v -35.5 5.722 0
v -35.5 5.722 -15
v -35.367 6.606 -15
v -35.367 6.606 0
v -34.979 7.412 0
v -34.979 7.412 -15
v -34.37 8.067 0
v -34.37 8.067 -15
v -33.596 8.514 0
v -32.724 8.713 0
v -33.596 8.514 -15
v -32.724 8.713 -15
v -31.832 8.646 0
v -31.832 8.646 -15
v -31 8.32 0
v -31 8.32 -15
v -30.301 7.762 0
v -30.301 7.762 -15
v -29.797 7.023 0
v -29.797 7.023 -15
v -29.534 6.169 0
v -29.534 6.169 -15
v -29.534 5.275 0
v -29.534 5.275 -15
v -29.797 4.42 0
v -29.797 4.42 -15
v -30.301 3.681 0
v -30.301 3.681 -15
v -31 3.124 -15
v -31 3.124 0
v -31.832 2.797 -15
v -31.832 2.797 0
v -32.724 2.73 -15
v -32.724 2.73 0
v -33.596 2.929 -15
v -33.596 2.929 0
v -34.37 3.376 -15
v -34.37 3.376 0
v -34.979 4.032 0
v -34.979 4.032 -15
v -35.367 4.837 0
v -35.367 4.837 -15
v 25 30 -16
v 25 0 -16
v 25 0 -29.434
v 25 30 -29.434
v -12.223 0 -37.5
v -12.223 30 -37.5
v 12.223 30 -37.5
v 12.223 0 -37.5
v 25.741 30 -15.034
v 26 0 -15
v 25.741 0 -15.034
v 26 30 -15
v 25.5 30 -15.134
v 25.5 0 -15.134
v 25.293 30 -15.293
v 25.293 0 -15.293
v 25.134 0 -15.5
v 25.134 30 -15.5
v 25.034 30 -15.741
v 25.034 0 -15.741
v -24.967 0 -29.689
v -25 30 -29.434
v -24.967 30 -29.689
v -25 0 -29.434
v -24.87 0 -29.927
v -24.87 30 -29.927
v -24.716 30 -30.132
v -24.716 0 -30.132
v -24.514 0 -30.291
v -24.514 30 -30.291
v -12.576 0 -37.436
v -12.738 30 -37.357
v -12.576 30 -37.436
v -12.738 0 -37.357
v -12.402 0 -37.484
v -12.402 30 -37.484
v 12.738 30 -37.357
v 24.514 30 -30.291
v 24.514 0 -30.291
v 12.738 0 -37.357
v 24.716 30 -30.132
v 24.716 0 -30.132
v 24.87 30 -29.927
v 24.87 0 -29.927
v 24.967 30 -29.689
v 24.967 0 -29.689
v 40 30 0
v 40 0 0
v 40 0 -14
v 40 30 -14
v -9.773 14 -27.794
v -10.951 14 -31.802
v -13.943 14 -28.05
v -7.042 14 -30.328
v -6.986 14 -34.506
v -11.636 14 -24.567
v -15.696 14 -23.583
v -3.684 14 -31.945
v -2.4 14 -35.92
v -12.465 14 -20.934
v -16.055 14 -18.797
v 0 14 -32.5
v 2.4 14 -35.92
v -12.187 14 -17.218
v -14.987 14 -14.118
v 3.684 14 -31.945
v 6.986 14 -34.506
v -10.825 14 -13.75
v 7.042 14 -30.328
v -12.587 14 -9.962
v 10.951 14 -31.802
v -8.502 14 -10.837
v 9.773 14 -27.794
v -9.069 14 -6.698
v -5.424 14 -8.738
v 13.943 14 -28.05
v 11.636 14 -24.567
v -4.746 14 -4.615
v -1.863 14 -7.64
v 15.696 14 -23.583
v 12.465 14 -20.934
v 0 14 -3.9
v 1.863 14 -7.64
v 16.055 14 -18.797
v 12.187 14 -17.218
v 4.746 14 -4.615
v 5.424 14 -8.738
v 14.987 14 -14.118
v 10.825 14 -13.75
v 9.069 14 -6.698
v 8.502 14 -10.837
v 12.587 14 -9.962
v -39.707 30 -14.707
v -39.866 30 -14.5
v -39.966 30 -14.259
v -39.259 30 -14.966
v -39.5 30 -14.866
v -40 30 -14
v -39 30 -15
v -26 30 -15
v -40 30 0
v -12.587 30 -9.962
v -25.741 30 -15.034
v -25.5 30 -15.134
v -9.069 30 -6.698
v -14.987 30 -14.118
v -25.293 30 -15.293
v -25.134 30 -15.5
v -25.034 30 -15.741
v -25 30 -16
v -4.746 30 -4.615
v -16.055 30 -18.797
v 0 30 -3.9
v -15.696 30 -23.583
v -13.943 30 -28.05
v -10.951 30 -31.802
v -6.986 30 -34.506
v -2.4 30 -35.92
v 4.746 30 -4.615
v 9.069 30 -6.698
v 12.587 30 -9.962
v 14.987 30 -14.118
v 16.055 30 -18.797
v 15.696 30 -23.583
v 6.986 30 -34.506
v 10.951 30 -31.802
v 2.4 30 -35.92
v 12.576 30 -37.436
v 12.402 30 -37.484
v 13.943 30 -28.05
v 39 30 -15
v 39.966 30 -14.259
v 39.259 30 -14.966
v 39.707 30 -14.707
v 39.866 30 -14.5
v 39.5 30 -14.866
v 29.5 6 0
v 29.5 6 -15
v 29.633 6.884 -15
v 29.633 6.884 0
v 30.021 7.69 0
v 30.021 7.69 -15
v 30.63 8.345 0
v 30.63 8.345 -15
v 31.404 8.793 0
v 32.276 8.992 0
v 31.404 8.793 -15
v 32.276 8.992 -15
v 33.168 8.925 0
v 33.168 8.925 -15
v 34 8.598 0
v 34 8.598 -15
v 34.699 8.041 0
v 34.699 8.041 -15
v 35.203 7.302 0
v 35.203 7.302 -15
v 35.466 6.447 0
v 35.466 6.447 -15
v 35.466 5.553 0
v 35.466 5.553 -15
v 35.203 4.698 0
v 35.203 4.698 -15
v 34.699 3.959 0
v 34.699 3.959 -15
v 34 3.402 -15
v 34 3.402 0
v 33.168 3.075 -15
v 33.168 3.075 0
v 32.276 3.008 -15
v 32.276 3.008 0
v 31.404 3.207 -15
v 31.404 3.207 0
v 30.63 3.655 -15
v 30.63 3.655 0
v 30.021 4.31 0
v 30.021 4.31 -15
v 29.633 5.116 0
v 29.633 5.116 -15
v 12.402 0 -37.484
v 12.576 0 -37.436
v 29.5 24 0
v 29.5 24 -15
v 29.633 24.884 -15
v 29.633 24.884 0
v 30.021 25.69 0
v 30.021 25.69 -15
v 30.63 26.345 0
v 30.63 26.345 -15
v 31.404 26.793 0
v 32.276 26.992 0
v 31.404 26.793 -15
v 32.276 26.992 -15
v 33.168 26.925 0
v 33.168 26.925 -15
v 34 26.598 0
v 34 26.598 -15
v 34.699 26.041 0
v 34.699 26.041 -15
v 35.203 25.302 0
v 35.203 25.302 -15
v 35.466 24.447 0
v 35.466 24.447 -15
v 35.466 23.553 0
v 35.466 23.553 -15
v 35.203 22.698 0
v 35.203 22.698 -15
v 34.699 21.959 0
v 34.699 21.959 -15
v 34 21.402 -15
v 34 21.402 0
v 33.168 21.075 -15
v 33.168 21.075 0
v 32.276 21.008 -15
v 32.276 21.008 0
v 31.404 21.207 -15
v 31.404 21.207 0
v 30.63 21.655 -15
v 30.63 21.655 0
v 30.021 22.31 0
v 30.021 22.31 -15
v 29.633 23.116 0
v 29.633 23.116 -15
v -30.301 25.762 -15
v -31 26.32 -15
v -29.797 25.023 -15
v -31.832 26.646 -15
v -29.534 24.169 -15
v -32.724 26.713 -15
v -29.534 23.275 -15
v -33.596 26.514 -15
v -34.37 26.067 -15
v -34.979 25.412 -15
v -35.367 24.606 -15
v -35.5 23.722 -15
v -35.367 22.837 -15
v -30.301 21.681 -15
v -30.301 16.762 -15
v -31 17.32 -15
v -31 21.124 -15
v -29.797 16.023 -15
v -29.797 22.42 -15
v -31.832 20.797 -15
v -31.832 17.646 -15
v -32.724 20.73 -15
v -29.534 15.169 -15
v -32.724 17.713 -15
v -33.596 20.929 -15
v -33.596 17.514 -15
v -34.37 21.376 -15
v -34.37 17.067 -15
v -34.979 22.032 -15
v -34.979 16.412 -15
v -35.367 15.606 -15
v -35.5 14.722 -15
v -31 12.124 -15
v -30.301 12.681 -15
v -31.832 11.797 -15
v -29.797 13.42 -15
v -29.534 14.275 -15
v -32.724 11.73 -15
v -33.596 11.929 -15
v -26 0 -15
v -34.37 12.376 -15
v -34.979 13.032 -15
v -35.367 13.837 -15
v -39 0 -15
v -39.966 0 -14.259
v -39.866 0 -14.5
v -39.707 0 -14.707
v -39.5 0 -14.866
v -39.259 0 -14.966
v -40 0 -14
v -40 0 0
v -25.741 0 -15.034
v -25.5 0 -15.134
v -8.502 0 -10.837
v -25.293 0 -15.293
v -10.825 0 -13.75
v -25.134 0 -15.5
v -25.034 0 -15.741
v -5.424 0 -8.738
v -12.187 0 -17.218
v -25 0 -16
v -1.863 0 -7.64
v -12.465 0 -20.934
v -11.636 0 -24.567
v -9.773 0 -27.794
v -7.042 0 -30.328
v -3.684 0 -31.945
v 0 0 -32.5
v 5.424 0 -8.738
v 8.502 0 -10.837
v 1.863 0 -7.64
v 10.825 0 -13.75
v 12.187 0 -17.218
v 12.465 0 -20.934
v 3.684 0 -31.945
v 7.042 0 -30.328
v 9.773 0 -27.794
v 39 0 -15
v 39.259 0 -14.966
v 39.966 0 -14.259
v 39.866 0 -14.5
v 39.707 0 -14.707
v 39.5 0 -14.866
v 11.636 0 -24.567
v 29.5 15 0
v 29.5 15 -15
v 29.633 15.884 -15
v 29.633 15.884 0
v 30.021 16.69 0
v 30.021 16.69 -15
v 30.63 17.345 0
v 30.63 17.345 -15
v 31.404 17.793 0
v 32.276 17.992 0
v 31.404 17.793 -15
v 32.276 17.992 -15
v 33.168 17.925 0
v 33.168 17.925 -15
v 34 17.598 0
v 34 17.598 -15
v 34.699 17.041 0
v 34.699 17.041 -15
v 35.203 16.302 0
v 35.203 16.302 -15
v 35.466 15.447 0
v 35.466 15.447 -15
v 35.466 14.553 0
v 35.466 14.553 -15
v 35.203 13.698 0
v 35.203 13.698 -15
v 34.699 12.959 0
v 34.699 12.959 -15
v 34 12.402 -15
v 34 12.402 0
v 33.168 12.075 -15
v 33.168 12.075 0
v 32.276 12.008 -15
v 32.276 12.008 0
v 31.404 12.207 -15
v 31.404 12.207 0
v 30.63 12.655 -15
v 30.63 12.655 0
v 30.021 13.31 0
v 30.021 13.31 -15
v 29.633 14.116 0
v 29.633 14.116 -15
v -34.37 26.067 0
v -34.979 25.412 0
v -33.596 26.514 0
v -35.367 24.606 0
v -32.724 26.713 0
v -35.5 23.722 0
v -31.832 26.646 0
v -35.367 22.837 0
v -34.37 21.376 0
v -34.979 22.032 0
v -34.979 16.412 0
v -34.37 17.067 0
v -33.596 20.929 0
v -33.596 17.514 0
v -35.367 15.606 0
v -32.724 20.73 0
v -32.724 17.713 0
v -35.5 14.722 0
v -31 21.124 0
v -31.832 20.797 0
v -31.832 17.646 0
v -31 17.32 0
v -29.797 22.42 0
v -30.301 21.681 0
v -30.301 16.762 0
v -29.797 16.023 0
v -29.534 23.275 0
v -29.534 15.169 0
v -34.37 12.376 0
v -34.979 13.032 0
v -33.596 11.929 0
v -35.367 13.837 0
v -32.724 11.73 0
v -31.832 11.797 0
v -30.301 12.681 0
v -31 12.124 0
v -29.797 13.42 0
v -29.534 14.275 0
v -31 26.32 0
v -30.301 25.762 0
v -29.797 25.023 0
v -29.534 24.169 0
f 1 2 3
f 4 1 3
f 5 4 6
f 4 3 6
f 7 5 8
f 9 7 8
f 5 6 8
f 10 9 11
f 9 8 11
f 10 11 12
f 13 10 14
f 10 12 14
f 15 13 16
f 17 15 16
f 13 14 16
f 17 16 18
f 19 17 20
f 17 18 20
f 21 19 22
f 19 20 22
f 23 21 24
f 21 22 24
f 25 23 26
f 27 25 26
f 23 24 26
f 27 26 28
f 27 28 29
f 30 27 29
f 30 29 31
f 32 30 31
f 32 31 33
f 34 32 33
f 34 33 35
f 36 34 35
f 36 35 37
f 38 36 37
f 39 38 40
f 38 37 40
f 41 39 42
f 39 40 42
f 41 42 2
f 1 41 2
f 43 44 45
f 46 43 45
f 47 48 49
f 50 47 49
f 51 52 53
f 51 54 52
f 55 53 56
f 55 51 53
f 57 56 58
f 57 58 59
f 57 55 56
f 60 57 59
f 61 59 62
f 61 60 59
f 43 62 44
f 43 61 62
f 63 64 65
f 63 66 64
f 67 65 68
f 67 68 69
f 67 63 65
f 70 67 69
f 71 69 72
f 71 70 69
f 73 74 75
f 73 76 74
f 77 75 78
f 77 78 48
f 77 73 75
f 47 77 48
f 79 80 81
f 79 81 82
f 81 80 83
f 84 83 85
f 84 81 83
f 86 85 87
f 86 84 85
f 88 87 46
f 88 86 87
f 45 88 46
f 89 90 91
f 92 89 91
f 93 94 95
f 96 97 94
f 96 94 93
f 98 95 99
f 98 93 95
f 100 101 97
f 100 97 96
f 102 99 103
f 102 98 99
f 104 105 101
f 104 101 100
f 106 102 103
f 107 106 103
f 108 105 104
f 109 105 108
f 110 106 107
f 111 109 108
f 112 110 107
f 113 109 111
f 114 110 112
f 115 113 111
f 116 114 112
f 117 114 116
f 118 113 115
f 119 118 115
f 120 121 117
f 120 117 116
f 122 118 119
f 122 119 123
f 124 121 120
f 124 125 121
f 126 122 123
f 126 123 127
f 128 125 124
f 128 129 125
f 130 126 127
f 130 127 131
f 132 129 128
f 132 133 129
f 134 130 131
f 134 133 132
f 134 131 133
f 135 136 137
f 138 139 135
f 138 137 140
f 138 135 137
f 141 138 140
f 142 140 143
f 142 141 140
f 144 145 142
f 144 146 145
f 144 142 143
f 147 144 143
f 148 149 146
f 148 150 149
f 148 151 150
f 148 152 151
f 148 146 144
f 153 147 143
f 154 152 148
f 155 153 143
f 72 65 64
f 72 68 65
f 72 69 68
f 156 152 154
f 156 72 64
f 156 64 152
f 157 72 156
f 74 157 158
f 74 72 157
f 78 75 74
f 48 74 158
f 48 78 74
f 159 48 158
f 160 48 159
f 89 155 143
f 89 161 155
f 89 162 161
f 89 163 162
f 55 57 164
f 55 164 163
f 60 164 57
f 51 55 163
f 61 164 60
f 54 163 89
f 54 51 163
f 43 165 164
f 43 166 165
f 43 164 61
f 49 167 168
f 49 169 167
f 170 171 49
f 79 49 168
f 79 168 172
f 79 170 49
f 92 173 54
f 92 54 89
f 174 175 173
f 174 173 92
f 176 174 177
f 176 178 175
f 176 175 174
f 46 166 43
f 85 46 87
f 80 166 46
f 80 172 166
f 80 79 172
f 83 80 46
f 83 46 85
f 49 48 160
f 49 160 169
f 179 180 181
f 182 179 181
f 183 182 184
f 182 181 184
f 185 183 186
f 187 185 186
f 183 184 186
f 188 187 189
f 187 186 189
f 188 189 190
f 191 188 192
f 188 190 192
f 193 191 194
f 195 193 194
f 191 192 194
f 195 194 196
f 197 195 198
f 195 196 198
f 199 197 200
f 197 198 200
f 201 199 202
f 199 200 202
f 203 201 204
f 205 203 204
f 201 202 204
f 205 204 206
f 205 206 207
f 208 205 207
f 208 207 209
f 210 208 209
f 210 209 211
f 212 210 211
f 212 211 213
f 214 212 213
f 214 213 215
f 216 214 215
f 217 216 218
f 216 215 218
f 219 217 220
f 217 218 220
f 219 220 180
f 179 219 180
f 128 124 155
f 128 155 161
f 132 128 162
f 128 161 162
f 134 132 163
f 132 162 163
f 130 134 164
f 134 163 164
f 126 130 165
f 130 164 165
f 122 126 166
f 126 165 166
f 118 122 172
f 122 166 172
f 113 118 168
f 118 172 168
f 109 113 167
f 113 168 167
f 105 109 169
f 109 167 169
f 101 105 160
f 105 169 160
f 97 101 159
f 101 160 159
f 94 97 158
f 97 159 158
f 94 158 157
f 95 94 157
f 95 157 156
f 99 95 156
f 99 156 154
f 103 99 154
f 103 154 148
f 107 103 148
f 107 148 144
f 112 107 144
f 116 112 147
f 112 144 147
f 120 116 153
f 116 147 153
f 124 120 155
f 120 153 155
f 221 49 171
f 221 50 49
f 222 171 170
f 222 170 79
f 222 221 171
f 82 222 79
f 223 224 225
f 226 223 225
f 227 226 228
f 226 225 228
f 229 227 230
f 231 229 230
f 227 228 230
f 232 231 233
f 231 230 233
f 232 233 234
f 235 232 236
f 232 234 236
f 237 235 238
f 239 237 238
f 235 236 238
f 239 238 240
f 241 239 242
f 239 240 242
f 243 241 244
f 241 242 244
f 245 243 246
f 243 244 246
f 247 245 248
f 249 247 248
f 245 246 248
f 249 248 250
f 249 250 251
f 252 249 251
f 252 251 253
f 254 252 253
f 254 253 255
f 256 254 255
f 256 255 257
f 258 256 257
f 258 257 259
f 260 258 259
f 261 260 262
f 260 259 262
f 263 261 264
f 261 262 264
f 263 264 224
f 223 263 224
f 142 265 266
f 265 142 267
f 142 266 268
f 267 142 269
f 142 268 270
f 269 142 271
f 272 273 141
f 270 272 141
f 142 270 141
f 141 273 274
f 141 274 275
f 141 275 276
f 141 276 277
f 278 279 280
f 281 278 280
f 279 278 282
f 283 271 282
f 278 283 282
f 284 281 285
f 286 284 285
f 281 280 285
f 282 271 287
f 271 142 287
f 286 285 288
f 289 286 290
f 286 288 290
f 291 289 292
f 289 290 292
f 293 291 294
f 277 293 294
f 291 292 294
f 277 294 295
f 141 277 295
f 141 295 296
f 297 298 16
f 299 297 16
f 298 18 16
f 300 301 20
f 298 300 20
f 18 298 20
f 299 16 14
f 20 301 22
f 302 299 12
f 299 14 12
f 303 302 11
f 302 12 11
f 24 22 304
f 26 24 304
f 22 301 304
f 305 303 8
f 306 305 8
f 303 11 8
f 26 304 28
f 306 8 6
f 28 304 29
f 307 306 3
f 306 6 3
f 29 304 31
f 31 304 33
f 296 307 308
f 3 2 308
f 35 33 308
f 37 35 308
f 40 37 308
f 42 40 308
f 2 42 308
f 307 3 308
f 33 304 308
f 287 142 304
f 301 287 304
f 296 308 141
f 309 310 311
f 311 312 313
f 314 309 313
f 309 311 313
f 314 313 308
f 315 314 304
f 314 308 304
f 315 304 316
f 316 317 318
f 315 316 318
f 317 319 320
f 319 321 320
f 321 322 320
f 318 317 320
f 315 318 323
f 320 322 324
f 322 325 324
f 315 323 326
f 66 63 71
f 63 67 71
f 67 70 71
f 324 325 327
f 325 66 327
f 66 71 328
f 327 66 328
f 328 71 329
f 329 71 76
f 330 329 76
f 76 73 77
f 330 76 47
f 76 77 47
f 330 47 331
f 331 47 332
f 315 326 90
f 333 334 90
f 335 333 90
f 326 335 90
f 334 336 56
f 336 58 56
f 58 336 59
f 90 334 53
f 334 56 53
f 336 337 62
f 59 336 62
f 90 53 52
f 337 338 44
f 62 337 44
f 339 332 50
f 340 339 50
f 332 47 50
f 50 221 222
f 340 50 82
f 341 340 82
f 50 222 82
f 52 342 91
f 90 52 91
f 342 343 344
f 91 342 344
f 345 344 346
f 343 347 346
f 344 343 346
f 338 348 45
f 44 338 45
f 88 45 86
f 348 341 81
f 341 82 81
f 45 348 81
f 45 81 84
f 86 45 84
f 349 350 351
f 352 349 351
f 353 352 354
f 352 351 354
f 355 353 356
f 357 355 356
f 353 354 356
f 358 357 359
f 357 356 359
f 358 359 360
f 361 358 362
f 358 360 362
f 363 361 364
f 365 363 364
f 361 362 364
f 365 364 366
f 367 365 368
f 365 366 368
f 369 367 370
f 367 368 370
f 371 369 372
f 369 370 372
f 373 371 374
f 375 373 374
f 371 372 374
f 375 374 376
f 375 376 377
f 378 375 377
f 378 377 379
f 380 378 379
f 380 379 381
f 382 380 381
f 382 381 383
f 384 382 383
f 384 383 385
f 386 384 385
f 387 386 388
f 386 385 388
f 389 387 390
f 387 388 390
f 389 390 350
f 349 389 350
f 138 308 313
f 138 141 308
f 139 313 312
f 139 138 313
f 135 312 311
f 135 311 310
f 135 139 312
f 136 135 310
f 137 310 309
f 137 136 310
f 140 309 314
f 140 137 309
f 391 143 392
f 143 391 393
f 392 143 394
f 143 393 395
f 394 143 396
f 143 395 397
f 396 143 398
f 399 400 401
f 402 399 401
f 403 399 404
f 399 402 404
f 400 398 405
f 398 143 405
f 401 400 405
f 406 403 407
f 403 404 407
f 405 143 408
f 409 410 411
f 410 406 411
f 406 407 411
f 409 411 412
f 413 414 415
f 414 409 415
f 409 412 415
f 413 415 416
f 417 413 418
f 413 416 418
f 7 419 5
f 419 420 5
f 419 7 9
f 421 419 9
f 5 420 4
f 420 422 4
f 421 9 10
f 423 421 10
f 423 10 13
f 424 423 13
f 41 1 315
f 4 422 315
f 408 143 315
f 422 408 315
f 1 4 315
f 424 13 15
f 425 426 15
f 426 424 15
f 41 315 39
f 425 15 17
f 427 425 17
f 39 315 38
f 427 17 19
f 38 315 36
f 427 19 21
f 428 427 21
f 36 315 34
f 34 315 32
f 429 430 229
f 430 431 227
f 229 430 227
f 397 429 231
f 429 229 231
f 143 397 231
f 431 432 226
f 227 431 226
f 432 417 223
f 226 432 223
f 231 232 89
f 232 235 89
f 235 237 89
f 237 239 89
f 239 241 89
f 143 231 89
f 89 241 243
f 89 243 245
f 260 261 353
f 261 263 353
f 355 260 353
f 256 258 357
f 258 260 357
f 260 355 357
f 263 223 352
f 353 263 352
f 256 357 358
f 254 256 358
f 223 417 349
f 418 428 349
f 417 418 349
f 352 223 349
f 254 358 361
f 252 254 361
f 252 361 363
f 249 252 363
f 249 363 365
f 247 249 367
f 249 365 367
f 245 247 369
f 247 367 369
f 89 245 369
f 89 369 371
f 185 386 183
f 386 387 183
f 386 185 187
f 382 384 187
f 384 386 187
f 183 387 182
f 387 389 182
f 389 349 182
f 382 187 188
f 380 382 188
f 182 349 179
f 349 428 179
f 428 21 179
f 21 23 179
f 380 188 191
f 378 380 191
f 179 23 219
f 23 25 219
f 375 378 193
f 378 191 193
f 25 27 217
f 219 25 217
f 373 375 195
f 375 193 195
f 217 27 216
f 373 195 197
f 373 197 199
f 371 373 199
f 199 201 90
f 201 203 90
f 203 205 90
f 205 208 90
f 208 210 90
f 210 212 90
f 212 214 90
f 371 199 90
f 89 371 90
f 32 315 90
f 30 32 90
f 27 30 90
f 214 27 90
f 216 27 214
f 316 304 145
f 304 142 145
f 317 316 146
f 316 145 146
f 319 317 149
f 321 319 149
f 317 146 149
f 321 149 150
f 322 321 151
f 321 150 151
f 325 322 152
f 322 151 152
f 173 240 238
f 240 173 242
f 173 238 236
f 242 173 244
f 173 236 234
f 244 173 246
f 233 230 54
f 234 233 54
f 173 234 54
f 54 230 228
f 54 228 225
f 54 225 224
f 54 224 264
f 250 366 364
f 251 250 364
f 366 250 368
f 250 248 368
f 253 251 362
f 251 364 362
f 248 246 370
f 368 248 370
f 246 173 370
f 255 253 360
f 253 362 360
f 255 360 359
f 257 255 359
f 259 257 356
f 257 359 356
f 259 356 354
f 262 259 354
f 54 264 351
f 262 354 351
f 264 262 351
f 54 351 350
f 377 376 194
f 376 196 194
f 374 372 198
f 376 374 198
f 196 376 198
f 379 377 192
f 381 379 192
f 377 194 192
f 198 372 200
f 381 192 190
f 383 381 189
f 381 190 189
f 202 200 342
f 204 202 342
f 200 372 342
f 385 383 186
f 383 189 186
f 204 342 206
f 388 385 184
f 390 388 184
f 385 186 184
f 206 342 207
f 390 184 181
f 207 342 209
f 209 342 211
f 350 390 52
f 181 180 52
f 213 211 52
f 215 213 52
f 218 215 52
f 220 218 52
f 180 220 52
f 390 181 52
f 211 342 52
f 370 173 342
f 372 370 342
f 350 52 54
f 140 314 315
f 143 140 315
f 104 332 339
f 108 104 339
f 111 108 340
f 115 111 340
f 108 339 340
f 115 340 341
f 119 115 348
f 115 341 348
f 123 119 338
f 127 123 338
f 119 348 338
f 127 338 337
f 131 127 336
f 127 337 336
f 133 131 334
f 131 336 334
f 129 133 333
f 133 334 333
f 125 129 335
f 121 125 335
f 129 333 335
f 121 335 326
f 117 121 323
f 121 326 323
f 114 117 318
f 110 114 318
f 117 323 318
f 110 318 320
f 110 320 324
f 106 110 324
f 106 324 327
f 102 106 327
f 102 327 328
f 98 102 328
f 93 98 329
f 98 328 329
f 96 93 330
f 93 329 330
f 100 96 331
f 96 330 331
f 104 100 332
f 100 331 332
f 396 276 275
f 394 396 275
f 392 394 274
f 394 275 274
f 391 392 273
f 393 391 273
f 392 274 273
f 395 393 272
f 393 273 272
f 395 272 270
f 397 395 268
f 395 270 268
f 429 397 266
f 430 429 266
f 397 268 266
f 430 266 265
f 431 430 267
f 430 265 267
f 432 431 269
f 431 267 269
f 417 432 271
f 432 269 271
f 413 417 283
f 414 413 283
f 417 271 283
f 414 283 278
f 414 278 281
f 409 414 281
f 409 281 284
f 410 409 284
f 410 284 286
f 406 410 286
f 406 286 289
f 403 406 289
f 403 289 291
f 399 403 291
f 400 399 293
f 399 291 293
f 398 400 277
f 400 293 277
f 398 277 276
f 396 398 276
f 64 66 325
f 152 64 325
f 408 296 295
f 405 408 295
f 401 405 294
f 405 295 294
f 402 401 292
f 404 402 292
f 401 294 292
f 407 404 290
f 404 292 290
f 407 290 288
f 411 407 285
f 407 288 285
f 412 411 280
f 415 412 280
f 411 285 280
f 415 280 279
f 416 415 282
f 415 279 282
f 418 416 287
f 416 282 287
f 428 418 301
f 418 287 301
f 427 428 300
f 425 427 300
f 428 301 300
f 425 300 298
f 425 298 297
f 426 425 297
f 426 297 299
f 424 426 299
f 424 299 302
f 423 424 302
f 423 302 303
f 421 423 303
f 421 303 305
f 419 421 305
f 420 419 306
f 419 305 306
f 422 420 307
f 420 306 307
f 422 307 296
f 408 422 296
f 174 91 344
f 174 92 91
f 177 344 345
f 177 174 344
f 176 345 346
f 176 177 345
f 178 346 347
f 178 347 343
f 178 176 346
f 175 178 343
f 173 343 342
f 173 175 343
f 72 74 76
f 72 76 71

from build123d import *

# Parameters (mm, degrees)
BOSS_EXTRUDE1_DEPTH = 30
SKETCH2_R           = 16.1
CUT_EXTRUDE1_DEPTH  = 16
SKETCH6_R           = 12.5
CUT_EXTRUDE2_DEPTH  = 14
SKETCH8_R           = 3
CUT_EXTRUDE4_DEPTH  = 15
SKETCH9_R           = 3
CUT_EXTRUDE5_DEPTH  = 15
CUT_EXTRUDE6_DEPTH  = 30
CUT_EXTRUDE7_DEPTH  = 30
CUT_EXTRUDE8_DEPTH  = 30
FILLET2_R           = 1
FILLET3_R           = 1


with BuildPart() as part:
    # Sketch1 → Boss-Extrude1 (new body)
    with BuildSketch(Plane(origin=(0, 0, 0), x_dir=(1, 0, 0), z_dir=(0, 1, 0))):
        Polygon((0, 0), (40, 0), (40, 15), (25, 15), (25, 45), (-25, 45), (-25, 15), (-40, 15), (-40, 0), align=None)
    extrude(amount=BOSS_EXTRUDE1_DEPTH)

    # Sketch2 → Cut-Extrude1 (cut)
    with BuildSketch(Plane(origin=(0, 30, 0), x_dir=(1, 0, 0), z_dir=(0, 1, 0))):
        with Locations(Location((0, 20, 0), (0, 0, 270))):
            Circle(SKETCH2_R)
    extrude(amount=-CUT_EXTRUDE1_DEPTH, mode=Mode.SUBTRACT)

    # Sketch6 → Cut-Extrude2 (cut)
    with BuildSketch(Plane.XZ):
        with Locations(Location((0, -20, 0), (0, 0, 270))):
            Circle(SKETCH6_R)
    extrude(amount=-CUT_EXTRUDE2_DEPTH, mode=Mode.SUBTRACT)

    # Sketch8 → Cut-Extrude4 (cut)
    with BuildSketch(Plane(origin=(0, 0, -15), x_dir=(-1, 0, 0), z_dir=(0, 0, -1))):
        with Locations((-32.5, 6)):
            Circle(SKETCH8_R)
        with Locations((-32.5, 15)):
            Circle(SKETCH8_R)
        with Locations((-32.5, 24)):
            Circle(SKETCH8_R)
    extrude(amount=-CUT_EXTRUDE4_DEPTH, mode=Mode.SUBTRACT)

    # Sketch9 → Cut-Extrude5 (cut)
    with BuildSketch(Plane(origin=(0, 0, -15), x_dir=(-1, 0, 0), z_dir=(0, 0, -1))):
        with Locations((32.5, 23.72166378)):
            Circle(SKETCH9_R)
        with Locations((32.5, 14.72166378)):
            Circle(SKETCH9_R)
        with Locations((32.5, 5.72166378)):
            Circle(SKETCH9_R)
    extrude(amount=-CUT_EXTRUDE5_DEPTH, mode=Mode.SUBTRACT)

    # Sketch11 → Cut-Extrude6 (cut)
    with BuildSketch(Plane(origin=(0, 30, 0), x_dir=(1, 0, 0), z_dir=(0, 1, 0))):
        Polygon((-25, 30), (-25, 45), (0, 45), align=None)
    extrude(amount=-CUT_EXTRUDE6_DEPTH, mode=Mode.SUBTRACT)

    # Sketch12 → Cut-Extrude7 (cut)
    with BuildSketch(Plane(origin=(0, 30, 0), x_dir=(1, 0, 0), z_dir=(0, 1, 0))):
        Polygon((25, 30), (0, 45), (25, 45), align=None)
    extrude(amount=-CUT_EXTRUDE7_DEPTH, mode=Mode.SUBTRACT)

    # Sketch13 → Cut-Extrude8 (cut)
    with BuildSketch(Plane(origin=(0, 30, 0), x_dir=(1, 0, 0), z_dir=(0, 1, 0))):
        Polygon((-12.5, 37.5), (12.5, 37.5), (0, 45), align=None)
    extrude(amount=-CUT_EXTRUDE8_DEPTH, mode=Mode.SUBTRACT)

    # Fillet2
    fillet2_edges = [part.edges().sort_by_distance(p)[0] for p in [
        (-25, 15, -15),
    ]]
    fillet(fillet2_edges, radius=FILLET2_R)

    # Fillet3
    fillet3_edges = [part.edges().sort_by_distance(p)[0] for p in [
        (-40, 15, -15),
        (25, 15, -15),
        (40, 15, -15),
        (-25, 15, -30),
        (25, 15, -30),
        (-12.5, 15, -37.5),
        (12.5, 15, -37.5),
    ]]
    fillet(fillet3_edges, radius=FILLET3_R)


solid = part.part
